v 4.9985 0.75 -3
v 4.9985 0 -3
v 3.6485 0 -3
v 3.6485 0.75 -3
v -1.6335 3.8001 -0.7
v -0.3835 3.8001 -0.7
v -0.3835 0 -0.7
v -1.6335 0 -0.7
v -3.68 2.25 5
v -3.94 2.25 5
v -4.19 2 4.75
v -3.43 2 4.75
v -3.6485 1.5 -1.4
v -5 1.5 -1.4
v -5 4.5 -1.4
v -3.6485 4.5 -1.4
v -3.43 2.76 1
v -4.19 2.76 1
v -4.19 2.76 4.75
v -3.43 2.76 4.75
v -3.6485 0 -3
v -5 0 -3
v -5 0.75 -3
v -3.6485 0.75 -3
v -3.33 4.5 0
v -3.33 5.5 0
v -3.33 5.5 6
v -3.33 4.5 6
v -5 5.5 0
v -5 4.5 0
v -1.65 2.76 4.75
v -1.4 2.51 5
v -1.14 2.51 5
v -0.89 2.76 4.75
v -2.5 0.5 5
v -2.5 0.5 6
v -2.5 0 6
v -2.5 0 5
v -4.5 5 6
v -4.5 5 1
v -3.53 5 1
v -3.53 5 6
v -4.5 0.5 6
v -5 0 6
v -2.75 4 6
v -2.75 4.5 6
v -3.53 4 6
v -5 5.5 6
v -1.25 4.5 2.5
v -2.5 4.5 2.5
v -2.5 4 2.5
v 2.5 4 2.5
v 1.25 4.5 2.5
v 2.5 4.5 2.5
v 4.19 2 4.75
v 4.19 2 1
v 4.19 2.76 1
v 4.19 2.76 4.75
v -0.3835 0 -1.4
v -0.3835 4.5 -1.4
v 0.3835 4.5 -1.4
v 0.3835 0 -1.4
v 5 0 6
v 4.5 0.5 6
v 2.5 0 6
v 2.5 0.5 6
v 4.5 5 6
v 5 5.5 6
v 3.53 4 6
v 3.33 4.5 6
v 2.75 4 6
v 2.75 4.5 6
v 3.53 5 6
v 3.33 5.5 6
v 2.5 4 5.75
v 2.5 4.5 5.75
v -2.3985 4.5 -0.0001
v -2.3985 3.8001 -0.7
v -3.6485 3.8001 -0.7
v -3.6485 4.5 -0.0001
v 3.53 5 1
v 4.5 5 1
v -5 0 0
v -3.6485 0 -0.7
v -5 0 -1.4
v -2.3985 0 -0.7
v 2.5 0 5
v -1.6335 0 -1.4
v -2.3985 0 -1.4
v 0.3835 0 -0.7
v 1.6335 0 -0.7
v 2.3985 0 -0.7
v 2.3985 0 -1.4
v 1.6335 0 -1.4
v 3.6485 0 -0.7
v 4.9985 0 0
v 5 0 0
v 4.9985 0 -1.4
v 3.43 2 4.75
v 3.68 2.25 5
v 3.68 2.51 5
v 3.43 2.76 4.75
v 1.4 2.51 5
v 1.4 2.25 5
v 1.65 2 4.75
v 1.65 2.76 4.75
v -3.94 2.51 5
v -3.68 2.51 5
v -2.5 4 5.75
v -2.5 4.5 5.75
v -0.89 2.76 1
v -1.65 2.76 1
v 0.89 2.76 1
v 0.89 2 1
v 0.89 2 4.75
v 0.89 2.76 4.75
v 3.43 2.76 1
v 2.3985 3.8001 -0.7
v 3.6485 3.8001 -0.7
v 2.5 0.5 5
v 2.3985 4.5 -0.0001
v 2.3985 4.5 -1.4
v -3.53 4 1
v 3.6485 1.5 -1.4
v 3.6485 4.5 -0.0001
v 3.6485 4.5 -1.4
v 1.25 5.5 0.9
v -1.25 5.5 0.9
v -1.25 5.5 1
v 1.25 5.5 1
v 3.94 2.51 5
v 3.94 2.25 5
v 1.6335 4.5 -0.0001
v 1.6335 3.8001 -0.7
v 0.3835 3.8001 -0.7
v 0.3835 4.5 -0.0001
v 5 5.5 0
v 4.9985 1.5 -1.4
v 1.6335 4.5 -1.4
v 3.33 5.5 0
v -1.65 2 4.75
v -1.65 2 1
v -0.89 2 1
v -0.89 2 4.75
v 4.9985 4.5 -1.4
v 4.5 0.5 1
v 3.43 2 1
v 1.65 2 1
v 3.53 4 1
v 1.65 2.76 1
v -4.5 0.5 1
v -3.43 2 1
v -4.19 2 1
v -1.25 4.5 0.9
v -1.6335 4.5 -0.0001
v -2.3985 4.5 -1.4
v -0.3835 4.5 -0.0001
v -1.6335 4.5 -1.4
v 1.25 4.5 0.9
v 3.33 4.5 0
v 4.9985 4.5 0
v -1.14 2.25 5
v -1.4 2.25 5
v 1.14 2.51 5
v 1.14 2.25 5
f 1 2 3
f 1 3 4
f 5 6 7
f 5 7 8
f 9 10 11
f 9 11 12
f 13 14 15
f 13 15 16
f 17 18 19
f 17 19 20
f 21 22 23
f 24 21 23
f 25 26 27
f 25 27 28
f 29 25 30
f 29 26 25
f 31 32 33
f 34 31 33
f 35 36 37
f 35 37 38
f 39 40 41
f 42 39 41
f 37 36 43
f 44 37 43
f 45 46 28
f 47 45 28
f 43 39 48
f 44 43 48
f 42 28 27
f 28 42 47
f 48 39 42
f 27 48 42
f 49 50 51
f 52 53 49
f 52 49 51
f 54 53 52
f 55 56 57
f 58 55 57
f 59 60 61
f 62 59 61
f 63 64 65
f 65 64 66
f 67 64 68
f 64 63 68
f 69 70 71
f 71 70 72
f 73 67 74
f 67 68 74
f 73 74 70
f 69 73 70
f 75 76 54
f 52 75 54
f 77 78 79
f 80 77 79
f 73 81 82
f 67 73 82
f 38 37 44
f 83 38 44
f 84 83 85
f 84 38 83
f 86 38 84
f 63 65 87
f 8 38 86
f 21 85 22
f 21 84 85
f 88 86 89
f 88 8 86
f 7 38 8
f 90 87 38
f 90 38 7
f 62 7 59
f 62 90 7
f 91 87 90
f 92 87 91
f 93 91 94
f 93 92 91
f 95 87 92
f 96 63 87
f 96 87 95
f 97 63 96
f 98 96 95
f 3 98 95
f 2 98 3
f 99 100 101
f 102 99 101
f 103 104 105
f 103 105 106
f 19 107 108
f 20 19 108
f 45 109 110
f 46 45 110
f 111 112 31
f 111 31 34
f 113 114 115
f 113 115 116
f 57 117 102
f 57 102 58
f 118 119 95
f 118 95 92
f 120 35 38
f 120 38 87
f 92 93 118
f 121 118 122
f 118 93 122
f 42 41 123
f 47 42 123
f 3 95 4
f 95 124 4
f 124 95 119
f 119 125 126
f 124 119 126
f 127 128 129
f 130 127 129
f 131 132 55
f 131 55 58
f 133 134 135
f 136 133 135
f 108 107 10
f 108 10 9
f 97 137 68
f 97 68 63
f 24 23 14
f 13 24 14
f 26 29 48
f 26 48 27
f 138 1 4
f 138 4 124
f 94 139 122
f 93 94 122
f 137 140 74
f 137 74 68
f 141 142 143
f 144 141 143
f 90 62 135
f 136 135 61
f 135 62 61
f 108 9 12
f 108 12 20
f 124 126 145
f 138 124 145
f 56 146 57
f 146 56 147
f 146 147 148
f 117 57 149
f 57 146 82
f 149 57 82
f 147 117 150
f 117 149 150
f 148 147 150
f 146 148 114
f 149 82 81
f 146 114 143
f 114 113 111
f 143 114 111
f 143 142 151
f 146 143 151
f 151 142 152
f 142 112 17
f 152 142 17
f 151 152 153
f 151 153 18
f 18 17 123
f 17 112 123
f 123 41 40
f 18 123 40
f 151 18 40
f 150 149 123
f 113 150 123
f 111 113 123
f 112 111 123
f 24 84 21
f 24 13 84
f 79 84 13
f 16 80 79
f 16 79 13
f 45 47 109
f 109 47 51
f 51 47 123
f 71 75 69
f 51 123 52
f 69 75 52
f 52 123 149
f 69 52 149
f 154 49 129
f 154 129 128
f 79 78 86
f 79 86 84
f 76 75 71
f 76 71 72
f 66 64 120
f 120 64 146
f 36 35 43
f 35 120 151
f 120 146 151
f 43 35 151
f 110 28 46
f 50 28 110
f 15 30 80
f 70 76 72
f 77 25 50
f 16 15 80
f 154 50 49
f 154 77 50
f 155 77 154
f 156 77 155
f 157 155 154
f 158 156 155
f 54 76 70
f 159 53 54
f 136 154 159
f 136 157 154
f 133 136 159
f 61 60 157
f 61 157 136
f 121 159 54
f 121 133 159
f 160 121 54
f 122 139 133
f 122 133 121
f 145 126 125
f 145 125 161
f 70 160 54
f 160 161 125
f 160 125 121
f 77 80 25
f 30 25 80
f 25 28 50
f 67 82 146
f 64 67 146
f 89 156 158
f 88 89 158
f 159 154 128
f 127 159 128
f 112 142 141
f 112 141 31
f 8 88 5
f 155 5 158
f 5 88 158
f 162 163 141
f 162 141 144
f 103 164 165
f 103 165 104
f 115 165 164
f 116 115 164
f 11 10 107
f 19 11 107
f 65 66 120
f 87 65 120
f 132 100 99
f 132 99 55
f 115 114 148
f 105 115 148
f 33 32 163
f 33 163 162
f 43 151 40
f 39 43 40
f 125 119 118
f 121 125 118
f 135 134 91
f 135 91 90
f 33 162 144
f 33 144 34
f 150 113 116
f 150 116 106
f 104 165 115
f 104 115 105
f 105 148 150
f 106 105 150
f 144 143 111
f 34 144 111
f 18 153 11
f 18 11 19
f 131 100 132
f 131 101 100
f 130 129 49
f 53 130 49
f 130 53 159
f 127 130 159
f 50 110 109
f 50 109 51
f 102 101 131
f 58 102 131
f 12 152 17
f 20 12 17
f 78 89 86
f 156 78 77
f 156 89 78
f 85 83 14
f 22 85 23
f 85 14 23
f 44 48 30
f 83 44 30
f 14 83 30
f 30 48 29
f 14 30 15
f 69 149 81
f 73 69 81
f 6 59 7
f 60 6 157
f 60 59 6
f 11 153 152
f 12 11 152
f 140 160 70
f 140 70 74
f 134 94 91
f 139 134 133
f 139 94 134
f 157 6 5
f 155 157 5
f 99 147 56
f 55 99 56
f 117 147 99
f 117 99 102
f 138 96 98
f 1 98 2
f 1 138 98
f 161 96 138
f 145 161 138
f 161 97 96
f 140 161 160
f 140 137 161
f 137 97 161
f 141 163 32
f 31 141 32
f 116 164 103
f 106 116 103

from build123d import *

# Parameters (mm, degrees)
BOSS_EXTRU_1_DEPTH      = 6
BOSS_EXTRU_2_DEPTH      = 1.25
BOSS_EXTRU_2_DEPTH_BACK = 1.25
BOSS_EXTRU_3_DEPTH      = 1
ESQUISSE4_W             = 9.998484941
ESQUISSE4_H             = 1.4
BOSS_EXTRU_4_DEPTH      = 4.5
ESQUISSE6_W             = 1.25
ESQUISSE6_H             = 4.5
ENL_V_MAT_EXTRU_1_DEPTH = 0.7
CHANFREIN1_SIZE         = 0.7
BOSS_EXTRU_5_DEPTH      = 1.351515059
BOSS_EXTRU_6_DEPTH      = 1.35
ESQUISSE9_W             = 0.76
ESQUISSE9_H             = 0.76
BOSS_EXTRU_7_DEPTH      = 4
CHANFREIN2_SIZE         = 0.25
ENL_V_MAT_EXTRU_2_REACH = 11.014
ESQUISSE10_W            = 5
ESQUISSE10_H            = 3.75
CHANFREIN3_SIZE         = 0.25
ENL_V_MAT_EXTRU_3_REACH = 11.274
ESQUISSE11_W            = 5
ESQUISSE11_H            = 1.25


with BuildPart() as part:
    # Esquisse1 → Boss.-Extru.1 (new body)
    with BuildSketch(Plane.XY):
        Polygon((5, 0), (-5, 0), (-5, 5.5), (-3.33, 5.5), (-3.33, 4.5), (3.33, 4.5), (3.33, 5.5), (5, 5.5), align=None)
        Polygon((-4.5, 5), (-3.53, 5), (-3.53, 4), (3.53, 4), (3.53, 5), (4.5, 5), (4.5, 0.5), (-4.5, 0.5), align=None, mode=Mode.SUBTRACT)
    extrude(amount=BOSS_EXTRU_1_DEPTH)

    # Esquisse2 → Boss.-Extru.2 (add, two sides: drawn at the far end of the back side and taken through both)
    with BuildSketch(Plane(origin=(0, 0, 0), x_dir=(0, 0, -1), z_dir=(1, 0, 0)).offset(-BOSS_EXTRU_2_DEPTH_BACK)):
        Polygon((-1, 5.5), (-2.5, 4.5), (-0.9, 4.5), (-0.9, 5.5), align=None)
    extrude(amount=BOSS_EXTRU_2_DEPTH + BOSS_EXTRU_2_DEPTH_BACK)

    # Esquisse3 → Boss.-Extru.3 (add)
    with BuildSketch(Plane(origin=(0, 0, 0), x_dir=(-1, 0, 0), z_dir=(0, 0, -1))):
        Polygon((-3.33, 5.5), (-5, 5.5), (-5, 0), (5, 0), (5, 5.5), (3.33, 5.5), (3.33, 4.5), (-3.33, 4.5), align=None)
    extrude(amount=-BOSS_EXTRU_3_DEPTH)

    # Esquisse4 → Boss.-Extru.4 (add)
    with BuildSketch(Plane(origin=(0, 4.5, 0), x_dir=(1, 0, 0), z_dir=(0, 1, 0))):
        with Locations((-0.000757529, 0.7)):
            Rectangle(ESQUISSE4_W, ESQUISSE4_H)
    extrude(amount=-BOSS_EXTRU_4_DEPTH)

    # Esquisse6 → Enlèv. mat.-Extru.1 (cut)
    with BuildSketch(Plane(origin=(0, 0, -1.4), x_dir=(-1, 0, 0), z_dir=(0, 0, -1))):
        with Locations((-3.023484941, 2.25)):
            Rectangle(ESQUISSE6_W, ESQUISSE6_H)
        with Locations((1.008484941, 2.25)):
            Rectangle(ESQUISSE6_W, ESQUISSE6_H)
        with Locations((-1.008484941, 2.25)):
            Rectangle(ESQUISSE6_W, ESQUISSE6_H)
        with Locations((3.023484941, 2.25)):
            Rectangle(ESQUISSE6_W, ESQUISSE6_H)
    extrude(amount=-ENL_V_MAT_EXTRU_1_DEPTH, mode=Mode.SUBTRACT)

    # Chanfrein1
    chanfrein1_edges = [part.edges().sort_by_distance(p)[0] for p in [
        (3.023484941, 4.5, -0.7),
        (1.008484941, 4.5, -0.7),
        (-1.008484941, 4.5, -0.7),
        (-3.023484941, 4.5, -0.7),
    ]]
    chamfer(chanfrein1_edges, length=CHANFREIN1_SIZE - 0.0001)  # a hair under: the kernel refuses the full size

    # Esquisse7 → Boss.-Extru.5 (add)
    with BuildSketch(Plane.ZY.offset(5)):
        Polygon((-1.4, 0), (-3, 0), (-3, 0.75), (-1.4, 1.5), align=None)
    extrude(amount=-BOSS_EXTRU_5_DEPTH)

    # Esquisse8 → Boss.-Extru.6 (add)
    with BuildSketch(Plane(origin=(4.998484941, 0, 0), x_dir=(0, 0, -1), z_dir=(1, 0, 0))):
        Polygon((1.4, 0), (3, 0), (3, 0.75), (1.4, 1.5), align=None)
    extrude(amount=-BOSS_EXTRU_6_DEPTH)

    # Esquisse9 → Boss.-Extru.7 (add)
    with BuildSketch(Plane.XY.offset(1)):
        with Locations((-1.27, 2.38)):
            Rectangle(ESQUISSE9_W, ESQUISSE9_H)
        with Locations((3.81, 2.38)):
            Rectangle(ESQUISSE9_W, ESQUISSE9_H)
        with Locations((-3.81, 2.38)):
            Rectangle(ESQUISSE9_W, ESQUISSE9_H)
        with Locations((1.27, 2.38)):
            Rectangle(ESQUISSE9_W, ESQUISSE9_H)
    extrude(amount=BOSS_EXTRU_7_DEPTH)

    # Chanfrein2
    chanfrein2_edges = [part.edges().sort_by_distance(p)[0] for p in [
        (-1.65, 2.38, 5),
        (-1.27, 2, 5),
        (-0.89, 2.38, 5),
        (-1.27, 2.76, 5),
        (-3.43, 2.38, 5),
        (-3.81, 2.76, 5),
        (-4.19, 2.38, 5),
        (-3.81, 2, 5),
        (3.81, 2, 5),
        (4.19, 2.38, 5),
        (3.81, 2.76, 5),
        (3.43, 2.38, 5),
        (1.27, 2.76, 5),
        (0.89, 2.38, 5),
        (1.27, 2, 5),
        (1.65, 2.38, 5),
    ]]
    chamfer(chanfrein2_edges, length=CHANFREIN2_SIZE)

    # Esquisse10 → Enlèv. mat.-Extru.2 (cut, up to next)
    with BuildSketch(Plane(origin=(0, 4.5, 0), x_dir=(1, 0, 0), z_dir=(0, 1, 0)), mode=Mode.PRIVATE) as enl_v_mat_extru_2_sk1:
        with Locations((0, -4.375)):
            Rectangle(ESQUISSE10_W, ESQUISSE10_H)
    enl_v_mat_extru_2_tool1 = extrude(enl_v_mat_extru_2_sk1.sketch, amount=-ENL_V_MAT_EXTRU_2_REACH, mode=Mode.PRIVATE) & part.part
    add(enl_v_mat_extru_2_tool1.solids().sort_by_distance((0, 4.5, 4.375))[0], mode=Mode.SUBTRACT)

    # Chanfrein3
    chanfrein3_edges = [part.edges().sort_by_distance(p)[0] for p in [
        (2.5, 4.25, 6),
        (-2.5, 4.25, 6),
    ]]
    chamfer(chanfrein3_edges, length=CHANFREIN3_SIZE)

    # Esquisse11 → Enlèv. mat.-Extru.3 (cut, up to next)
    with BuildSketch(Plane(origin=(0, 0.5, 0), x_dir=(1, 0, 0), z_dir=(0, 1, 0)), mode=Mode.PRIVATE) as enl_v_mat_extru_3_sk1:
        with Locations((0, -5.625)):
            Rectangle(ESQUISSE11_W, ESQUISSE11_H)
    enl_v_mat_extru_3_tool1 = extrude(enl_v_mat_extru_3_sk1.sketch, amount=-ENL_V_MAT_EXTRU_3_REACH, mode=Mode.PRIVATE) & part.part
    add(enl_v_mat_extru_3_tool1.solids().sort_by_distance((0, 0.5, 5.625))[0], mode=Mode.SUBTRACT)


solid = part.part
